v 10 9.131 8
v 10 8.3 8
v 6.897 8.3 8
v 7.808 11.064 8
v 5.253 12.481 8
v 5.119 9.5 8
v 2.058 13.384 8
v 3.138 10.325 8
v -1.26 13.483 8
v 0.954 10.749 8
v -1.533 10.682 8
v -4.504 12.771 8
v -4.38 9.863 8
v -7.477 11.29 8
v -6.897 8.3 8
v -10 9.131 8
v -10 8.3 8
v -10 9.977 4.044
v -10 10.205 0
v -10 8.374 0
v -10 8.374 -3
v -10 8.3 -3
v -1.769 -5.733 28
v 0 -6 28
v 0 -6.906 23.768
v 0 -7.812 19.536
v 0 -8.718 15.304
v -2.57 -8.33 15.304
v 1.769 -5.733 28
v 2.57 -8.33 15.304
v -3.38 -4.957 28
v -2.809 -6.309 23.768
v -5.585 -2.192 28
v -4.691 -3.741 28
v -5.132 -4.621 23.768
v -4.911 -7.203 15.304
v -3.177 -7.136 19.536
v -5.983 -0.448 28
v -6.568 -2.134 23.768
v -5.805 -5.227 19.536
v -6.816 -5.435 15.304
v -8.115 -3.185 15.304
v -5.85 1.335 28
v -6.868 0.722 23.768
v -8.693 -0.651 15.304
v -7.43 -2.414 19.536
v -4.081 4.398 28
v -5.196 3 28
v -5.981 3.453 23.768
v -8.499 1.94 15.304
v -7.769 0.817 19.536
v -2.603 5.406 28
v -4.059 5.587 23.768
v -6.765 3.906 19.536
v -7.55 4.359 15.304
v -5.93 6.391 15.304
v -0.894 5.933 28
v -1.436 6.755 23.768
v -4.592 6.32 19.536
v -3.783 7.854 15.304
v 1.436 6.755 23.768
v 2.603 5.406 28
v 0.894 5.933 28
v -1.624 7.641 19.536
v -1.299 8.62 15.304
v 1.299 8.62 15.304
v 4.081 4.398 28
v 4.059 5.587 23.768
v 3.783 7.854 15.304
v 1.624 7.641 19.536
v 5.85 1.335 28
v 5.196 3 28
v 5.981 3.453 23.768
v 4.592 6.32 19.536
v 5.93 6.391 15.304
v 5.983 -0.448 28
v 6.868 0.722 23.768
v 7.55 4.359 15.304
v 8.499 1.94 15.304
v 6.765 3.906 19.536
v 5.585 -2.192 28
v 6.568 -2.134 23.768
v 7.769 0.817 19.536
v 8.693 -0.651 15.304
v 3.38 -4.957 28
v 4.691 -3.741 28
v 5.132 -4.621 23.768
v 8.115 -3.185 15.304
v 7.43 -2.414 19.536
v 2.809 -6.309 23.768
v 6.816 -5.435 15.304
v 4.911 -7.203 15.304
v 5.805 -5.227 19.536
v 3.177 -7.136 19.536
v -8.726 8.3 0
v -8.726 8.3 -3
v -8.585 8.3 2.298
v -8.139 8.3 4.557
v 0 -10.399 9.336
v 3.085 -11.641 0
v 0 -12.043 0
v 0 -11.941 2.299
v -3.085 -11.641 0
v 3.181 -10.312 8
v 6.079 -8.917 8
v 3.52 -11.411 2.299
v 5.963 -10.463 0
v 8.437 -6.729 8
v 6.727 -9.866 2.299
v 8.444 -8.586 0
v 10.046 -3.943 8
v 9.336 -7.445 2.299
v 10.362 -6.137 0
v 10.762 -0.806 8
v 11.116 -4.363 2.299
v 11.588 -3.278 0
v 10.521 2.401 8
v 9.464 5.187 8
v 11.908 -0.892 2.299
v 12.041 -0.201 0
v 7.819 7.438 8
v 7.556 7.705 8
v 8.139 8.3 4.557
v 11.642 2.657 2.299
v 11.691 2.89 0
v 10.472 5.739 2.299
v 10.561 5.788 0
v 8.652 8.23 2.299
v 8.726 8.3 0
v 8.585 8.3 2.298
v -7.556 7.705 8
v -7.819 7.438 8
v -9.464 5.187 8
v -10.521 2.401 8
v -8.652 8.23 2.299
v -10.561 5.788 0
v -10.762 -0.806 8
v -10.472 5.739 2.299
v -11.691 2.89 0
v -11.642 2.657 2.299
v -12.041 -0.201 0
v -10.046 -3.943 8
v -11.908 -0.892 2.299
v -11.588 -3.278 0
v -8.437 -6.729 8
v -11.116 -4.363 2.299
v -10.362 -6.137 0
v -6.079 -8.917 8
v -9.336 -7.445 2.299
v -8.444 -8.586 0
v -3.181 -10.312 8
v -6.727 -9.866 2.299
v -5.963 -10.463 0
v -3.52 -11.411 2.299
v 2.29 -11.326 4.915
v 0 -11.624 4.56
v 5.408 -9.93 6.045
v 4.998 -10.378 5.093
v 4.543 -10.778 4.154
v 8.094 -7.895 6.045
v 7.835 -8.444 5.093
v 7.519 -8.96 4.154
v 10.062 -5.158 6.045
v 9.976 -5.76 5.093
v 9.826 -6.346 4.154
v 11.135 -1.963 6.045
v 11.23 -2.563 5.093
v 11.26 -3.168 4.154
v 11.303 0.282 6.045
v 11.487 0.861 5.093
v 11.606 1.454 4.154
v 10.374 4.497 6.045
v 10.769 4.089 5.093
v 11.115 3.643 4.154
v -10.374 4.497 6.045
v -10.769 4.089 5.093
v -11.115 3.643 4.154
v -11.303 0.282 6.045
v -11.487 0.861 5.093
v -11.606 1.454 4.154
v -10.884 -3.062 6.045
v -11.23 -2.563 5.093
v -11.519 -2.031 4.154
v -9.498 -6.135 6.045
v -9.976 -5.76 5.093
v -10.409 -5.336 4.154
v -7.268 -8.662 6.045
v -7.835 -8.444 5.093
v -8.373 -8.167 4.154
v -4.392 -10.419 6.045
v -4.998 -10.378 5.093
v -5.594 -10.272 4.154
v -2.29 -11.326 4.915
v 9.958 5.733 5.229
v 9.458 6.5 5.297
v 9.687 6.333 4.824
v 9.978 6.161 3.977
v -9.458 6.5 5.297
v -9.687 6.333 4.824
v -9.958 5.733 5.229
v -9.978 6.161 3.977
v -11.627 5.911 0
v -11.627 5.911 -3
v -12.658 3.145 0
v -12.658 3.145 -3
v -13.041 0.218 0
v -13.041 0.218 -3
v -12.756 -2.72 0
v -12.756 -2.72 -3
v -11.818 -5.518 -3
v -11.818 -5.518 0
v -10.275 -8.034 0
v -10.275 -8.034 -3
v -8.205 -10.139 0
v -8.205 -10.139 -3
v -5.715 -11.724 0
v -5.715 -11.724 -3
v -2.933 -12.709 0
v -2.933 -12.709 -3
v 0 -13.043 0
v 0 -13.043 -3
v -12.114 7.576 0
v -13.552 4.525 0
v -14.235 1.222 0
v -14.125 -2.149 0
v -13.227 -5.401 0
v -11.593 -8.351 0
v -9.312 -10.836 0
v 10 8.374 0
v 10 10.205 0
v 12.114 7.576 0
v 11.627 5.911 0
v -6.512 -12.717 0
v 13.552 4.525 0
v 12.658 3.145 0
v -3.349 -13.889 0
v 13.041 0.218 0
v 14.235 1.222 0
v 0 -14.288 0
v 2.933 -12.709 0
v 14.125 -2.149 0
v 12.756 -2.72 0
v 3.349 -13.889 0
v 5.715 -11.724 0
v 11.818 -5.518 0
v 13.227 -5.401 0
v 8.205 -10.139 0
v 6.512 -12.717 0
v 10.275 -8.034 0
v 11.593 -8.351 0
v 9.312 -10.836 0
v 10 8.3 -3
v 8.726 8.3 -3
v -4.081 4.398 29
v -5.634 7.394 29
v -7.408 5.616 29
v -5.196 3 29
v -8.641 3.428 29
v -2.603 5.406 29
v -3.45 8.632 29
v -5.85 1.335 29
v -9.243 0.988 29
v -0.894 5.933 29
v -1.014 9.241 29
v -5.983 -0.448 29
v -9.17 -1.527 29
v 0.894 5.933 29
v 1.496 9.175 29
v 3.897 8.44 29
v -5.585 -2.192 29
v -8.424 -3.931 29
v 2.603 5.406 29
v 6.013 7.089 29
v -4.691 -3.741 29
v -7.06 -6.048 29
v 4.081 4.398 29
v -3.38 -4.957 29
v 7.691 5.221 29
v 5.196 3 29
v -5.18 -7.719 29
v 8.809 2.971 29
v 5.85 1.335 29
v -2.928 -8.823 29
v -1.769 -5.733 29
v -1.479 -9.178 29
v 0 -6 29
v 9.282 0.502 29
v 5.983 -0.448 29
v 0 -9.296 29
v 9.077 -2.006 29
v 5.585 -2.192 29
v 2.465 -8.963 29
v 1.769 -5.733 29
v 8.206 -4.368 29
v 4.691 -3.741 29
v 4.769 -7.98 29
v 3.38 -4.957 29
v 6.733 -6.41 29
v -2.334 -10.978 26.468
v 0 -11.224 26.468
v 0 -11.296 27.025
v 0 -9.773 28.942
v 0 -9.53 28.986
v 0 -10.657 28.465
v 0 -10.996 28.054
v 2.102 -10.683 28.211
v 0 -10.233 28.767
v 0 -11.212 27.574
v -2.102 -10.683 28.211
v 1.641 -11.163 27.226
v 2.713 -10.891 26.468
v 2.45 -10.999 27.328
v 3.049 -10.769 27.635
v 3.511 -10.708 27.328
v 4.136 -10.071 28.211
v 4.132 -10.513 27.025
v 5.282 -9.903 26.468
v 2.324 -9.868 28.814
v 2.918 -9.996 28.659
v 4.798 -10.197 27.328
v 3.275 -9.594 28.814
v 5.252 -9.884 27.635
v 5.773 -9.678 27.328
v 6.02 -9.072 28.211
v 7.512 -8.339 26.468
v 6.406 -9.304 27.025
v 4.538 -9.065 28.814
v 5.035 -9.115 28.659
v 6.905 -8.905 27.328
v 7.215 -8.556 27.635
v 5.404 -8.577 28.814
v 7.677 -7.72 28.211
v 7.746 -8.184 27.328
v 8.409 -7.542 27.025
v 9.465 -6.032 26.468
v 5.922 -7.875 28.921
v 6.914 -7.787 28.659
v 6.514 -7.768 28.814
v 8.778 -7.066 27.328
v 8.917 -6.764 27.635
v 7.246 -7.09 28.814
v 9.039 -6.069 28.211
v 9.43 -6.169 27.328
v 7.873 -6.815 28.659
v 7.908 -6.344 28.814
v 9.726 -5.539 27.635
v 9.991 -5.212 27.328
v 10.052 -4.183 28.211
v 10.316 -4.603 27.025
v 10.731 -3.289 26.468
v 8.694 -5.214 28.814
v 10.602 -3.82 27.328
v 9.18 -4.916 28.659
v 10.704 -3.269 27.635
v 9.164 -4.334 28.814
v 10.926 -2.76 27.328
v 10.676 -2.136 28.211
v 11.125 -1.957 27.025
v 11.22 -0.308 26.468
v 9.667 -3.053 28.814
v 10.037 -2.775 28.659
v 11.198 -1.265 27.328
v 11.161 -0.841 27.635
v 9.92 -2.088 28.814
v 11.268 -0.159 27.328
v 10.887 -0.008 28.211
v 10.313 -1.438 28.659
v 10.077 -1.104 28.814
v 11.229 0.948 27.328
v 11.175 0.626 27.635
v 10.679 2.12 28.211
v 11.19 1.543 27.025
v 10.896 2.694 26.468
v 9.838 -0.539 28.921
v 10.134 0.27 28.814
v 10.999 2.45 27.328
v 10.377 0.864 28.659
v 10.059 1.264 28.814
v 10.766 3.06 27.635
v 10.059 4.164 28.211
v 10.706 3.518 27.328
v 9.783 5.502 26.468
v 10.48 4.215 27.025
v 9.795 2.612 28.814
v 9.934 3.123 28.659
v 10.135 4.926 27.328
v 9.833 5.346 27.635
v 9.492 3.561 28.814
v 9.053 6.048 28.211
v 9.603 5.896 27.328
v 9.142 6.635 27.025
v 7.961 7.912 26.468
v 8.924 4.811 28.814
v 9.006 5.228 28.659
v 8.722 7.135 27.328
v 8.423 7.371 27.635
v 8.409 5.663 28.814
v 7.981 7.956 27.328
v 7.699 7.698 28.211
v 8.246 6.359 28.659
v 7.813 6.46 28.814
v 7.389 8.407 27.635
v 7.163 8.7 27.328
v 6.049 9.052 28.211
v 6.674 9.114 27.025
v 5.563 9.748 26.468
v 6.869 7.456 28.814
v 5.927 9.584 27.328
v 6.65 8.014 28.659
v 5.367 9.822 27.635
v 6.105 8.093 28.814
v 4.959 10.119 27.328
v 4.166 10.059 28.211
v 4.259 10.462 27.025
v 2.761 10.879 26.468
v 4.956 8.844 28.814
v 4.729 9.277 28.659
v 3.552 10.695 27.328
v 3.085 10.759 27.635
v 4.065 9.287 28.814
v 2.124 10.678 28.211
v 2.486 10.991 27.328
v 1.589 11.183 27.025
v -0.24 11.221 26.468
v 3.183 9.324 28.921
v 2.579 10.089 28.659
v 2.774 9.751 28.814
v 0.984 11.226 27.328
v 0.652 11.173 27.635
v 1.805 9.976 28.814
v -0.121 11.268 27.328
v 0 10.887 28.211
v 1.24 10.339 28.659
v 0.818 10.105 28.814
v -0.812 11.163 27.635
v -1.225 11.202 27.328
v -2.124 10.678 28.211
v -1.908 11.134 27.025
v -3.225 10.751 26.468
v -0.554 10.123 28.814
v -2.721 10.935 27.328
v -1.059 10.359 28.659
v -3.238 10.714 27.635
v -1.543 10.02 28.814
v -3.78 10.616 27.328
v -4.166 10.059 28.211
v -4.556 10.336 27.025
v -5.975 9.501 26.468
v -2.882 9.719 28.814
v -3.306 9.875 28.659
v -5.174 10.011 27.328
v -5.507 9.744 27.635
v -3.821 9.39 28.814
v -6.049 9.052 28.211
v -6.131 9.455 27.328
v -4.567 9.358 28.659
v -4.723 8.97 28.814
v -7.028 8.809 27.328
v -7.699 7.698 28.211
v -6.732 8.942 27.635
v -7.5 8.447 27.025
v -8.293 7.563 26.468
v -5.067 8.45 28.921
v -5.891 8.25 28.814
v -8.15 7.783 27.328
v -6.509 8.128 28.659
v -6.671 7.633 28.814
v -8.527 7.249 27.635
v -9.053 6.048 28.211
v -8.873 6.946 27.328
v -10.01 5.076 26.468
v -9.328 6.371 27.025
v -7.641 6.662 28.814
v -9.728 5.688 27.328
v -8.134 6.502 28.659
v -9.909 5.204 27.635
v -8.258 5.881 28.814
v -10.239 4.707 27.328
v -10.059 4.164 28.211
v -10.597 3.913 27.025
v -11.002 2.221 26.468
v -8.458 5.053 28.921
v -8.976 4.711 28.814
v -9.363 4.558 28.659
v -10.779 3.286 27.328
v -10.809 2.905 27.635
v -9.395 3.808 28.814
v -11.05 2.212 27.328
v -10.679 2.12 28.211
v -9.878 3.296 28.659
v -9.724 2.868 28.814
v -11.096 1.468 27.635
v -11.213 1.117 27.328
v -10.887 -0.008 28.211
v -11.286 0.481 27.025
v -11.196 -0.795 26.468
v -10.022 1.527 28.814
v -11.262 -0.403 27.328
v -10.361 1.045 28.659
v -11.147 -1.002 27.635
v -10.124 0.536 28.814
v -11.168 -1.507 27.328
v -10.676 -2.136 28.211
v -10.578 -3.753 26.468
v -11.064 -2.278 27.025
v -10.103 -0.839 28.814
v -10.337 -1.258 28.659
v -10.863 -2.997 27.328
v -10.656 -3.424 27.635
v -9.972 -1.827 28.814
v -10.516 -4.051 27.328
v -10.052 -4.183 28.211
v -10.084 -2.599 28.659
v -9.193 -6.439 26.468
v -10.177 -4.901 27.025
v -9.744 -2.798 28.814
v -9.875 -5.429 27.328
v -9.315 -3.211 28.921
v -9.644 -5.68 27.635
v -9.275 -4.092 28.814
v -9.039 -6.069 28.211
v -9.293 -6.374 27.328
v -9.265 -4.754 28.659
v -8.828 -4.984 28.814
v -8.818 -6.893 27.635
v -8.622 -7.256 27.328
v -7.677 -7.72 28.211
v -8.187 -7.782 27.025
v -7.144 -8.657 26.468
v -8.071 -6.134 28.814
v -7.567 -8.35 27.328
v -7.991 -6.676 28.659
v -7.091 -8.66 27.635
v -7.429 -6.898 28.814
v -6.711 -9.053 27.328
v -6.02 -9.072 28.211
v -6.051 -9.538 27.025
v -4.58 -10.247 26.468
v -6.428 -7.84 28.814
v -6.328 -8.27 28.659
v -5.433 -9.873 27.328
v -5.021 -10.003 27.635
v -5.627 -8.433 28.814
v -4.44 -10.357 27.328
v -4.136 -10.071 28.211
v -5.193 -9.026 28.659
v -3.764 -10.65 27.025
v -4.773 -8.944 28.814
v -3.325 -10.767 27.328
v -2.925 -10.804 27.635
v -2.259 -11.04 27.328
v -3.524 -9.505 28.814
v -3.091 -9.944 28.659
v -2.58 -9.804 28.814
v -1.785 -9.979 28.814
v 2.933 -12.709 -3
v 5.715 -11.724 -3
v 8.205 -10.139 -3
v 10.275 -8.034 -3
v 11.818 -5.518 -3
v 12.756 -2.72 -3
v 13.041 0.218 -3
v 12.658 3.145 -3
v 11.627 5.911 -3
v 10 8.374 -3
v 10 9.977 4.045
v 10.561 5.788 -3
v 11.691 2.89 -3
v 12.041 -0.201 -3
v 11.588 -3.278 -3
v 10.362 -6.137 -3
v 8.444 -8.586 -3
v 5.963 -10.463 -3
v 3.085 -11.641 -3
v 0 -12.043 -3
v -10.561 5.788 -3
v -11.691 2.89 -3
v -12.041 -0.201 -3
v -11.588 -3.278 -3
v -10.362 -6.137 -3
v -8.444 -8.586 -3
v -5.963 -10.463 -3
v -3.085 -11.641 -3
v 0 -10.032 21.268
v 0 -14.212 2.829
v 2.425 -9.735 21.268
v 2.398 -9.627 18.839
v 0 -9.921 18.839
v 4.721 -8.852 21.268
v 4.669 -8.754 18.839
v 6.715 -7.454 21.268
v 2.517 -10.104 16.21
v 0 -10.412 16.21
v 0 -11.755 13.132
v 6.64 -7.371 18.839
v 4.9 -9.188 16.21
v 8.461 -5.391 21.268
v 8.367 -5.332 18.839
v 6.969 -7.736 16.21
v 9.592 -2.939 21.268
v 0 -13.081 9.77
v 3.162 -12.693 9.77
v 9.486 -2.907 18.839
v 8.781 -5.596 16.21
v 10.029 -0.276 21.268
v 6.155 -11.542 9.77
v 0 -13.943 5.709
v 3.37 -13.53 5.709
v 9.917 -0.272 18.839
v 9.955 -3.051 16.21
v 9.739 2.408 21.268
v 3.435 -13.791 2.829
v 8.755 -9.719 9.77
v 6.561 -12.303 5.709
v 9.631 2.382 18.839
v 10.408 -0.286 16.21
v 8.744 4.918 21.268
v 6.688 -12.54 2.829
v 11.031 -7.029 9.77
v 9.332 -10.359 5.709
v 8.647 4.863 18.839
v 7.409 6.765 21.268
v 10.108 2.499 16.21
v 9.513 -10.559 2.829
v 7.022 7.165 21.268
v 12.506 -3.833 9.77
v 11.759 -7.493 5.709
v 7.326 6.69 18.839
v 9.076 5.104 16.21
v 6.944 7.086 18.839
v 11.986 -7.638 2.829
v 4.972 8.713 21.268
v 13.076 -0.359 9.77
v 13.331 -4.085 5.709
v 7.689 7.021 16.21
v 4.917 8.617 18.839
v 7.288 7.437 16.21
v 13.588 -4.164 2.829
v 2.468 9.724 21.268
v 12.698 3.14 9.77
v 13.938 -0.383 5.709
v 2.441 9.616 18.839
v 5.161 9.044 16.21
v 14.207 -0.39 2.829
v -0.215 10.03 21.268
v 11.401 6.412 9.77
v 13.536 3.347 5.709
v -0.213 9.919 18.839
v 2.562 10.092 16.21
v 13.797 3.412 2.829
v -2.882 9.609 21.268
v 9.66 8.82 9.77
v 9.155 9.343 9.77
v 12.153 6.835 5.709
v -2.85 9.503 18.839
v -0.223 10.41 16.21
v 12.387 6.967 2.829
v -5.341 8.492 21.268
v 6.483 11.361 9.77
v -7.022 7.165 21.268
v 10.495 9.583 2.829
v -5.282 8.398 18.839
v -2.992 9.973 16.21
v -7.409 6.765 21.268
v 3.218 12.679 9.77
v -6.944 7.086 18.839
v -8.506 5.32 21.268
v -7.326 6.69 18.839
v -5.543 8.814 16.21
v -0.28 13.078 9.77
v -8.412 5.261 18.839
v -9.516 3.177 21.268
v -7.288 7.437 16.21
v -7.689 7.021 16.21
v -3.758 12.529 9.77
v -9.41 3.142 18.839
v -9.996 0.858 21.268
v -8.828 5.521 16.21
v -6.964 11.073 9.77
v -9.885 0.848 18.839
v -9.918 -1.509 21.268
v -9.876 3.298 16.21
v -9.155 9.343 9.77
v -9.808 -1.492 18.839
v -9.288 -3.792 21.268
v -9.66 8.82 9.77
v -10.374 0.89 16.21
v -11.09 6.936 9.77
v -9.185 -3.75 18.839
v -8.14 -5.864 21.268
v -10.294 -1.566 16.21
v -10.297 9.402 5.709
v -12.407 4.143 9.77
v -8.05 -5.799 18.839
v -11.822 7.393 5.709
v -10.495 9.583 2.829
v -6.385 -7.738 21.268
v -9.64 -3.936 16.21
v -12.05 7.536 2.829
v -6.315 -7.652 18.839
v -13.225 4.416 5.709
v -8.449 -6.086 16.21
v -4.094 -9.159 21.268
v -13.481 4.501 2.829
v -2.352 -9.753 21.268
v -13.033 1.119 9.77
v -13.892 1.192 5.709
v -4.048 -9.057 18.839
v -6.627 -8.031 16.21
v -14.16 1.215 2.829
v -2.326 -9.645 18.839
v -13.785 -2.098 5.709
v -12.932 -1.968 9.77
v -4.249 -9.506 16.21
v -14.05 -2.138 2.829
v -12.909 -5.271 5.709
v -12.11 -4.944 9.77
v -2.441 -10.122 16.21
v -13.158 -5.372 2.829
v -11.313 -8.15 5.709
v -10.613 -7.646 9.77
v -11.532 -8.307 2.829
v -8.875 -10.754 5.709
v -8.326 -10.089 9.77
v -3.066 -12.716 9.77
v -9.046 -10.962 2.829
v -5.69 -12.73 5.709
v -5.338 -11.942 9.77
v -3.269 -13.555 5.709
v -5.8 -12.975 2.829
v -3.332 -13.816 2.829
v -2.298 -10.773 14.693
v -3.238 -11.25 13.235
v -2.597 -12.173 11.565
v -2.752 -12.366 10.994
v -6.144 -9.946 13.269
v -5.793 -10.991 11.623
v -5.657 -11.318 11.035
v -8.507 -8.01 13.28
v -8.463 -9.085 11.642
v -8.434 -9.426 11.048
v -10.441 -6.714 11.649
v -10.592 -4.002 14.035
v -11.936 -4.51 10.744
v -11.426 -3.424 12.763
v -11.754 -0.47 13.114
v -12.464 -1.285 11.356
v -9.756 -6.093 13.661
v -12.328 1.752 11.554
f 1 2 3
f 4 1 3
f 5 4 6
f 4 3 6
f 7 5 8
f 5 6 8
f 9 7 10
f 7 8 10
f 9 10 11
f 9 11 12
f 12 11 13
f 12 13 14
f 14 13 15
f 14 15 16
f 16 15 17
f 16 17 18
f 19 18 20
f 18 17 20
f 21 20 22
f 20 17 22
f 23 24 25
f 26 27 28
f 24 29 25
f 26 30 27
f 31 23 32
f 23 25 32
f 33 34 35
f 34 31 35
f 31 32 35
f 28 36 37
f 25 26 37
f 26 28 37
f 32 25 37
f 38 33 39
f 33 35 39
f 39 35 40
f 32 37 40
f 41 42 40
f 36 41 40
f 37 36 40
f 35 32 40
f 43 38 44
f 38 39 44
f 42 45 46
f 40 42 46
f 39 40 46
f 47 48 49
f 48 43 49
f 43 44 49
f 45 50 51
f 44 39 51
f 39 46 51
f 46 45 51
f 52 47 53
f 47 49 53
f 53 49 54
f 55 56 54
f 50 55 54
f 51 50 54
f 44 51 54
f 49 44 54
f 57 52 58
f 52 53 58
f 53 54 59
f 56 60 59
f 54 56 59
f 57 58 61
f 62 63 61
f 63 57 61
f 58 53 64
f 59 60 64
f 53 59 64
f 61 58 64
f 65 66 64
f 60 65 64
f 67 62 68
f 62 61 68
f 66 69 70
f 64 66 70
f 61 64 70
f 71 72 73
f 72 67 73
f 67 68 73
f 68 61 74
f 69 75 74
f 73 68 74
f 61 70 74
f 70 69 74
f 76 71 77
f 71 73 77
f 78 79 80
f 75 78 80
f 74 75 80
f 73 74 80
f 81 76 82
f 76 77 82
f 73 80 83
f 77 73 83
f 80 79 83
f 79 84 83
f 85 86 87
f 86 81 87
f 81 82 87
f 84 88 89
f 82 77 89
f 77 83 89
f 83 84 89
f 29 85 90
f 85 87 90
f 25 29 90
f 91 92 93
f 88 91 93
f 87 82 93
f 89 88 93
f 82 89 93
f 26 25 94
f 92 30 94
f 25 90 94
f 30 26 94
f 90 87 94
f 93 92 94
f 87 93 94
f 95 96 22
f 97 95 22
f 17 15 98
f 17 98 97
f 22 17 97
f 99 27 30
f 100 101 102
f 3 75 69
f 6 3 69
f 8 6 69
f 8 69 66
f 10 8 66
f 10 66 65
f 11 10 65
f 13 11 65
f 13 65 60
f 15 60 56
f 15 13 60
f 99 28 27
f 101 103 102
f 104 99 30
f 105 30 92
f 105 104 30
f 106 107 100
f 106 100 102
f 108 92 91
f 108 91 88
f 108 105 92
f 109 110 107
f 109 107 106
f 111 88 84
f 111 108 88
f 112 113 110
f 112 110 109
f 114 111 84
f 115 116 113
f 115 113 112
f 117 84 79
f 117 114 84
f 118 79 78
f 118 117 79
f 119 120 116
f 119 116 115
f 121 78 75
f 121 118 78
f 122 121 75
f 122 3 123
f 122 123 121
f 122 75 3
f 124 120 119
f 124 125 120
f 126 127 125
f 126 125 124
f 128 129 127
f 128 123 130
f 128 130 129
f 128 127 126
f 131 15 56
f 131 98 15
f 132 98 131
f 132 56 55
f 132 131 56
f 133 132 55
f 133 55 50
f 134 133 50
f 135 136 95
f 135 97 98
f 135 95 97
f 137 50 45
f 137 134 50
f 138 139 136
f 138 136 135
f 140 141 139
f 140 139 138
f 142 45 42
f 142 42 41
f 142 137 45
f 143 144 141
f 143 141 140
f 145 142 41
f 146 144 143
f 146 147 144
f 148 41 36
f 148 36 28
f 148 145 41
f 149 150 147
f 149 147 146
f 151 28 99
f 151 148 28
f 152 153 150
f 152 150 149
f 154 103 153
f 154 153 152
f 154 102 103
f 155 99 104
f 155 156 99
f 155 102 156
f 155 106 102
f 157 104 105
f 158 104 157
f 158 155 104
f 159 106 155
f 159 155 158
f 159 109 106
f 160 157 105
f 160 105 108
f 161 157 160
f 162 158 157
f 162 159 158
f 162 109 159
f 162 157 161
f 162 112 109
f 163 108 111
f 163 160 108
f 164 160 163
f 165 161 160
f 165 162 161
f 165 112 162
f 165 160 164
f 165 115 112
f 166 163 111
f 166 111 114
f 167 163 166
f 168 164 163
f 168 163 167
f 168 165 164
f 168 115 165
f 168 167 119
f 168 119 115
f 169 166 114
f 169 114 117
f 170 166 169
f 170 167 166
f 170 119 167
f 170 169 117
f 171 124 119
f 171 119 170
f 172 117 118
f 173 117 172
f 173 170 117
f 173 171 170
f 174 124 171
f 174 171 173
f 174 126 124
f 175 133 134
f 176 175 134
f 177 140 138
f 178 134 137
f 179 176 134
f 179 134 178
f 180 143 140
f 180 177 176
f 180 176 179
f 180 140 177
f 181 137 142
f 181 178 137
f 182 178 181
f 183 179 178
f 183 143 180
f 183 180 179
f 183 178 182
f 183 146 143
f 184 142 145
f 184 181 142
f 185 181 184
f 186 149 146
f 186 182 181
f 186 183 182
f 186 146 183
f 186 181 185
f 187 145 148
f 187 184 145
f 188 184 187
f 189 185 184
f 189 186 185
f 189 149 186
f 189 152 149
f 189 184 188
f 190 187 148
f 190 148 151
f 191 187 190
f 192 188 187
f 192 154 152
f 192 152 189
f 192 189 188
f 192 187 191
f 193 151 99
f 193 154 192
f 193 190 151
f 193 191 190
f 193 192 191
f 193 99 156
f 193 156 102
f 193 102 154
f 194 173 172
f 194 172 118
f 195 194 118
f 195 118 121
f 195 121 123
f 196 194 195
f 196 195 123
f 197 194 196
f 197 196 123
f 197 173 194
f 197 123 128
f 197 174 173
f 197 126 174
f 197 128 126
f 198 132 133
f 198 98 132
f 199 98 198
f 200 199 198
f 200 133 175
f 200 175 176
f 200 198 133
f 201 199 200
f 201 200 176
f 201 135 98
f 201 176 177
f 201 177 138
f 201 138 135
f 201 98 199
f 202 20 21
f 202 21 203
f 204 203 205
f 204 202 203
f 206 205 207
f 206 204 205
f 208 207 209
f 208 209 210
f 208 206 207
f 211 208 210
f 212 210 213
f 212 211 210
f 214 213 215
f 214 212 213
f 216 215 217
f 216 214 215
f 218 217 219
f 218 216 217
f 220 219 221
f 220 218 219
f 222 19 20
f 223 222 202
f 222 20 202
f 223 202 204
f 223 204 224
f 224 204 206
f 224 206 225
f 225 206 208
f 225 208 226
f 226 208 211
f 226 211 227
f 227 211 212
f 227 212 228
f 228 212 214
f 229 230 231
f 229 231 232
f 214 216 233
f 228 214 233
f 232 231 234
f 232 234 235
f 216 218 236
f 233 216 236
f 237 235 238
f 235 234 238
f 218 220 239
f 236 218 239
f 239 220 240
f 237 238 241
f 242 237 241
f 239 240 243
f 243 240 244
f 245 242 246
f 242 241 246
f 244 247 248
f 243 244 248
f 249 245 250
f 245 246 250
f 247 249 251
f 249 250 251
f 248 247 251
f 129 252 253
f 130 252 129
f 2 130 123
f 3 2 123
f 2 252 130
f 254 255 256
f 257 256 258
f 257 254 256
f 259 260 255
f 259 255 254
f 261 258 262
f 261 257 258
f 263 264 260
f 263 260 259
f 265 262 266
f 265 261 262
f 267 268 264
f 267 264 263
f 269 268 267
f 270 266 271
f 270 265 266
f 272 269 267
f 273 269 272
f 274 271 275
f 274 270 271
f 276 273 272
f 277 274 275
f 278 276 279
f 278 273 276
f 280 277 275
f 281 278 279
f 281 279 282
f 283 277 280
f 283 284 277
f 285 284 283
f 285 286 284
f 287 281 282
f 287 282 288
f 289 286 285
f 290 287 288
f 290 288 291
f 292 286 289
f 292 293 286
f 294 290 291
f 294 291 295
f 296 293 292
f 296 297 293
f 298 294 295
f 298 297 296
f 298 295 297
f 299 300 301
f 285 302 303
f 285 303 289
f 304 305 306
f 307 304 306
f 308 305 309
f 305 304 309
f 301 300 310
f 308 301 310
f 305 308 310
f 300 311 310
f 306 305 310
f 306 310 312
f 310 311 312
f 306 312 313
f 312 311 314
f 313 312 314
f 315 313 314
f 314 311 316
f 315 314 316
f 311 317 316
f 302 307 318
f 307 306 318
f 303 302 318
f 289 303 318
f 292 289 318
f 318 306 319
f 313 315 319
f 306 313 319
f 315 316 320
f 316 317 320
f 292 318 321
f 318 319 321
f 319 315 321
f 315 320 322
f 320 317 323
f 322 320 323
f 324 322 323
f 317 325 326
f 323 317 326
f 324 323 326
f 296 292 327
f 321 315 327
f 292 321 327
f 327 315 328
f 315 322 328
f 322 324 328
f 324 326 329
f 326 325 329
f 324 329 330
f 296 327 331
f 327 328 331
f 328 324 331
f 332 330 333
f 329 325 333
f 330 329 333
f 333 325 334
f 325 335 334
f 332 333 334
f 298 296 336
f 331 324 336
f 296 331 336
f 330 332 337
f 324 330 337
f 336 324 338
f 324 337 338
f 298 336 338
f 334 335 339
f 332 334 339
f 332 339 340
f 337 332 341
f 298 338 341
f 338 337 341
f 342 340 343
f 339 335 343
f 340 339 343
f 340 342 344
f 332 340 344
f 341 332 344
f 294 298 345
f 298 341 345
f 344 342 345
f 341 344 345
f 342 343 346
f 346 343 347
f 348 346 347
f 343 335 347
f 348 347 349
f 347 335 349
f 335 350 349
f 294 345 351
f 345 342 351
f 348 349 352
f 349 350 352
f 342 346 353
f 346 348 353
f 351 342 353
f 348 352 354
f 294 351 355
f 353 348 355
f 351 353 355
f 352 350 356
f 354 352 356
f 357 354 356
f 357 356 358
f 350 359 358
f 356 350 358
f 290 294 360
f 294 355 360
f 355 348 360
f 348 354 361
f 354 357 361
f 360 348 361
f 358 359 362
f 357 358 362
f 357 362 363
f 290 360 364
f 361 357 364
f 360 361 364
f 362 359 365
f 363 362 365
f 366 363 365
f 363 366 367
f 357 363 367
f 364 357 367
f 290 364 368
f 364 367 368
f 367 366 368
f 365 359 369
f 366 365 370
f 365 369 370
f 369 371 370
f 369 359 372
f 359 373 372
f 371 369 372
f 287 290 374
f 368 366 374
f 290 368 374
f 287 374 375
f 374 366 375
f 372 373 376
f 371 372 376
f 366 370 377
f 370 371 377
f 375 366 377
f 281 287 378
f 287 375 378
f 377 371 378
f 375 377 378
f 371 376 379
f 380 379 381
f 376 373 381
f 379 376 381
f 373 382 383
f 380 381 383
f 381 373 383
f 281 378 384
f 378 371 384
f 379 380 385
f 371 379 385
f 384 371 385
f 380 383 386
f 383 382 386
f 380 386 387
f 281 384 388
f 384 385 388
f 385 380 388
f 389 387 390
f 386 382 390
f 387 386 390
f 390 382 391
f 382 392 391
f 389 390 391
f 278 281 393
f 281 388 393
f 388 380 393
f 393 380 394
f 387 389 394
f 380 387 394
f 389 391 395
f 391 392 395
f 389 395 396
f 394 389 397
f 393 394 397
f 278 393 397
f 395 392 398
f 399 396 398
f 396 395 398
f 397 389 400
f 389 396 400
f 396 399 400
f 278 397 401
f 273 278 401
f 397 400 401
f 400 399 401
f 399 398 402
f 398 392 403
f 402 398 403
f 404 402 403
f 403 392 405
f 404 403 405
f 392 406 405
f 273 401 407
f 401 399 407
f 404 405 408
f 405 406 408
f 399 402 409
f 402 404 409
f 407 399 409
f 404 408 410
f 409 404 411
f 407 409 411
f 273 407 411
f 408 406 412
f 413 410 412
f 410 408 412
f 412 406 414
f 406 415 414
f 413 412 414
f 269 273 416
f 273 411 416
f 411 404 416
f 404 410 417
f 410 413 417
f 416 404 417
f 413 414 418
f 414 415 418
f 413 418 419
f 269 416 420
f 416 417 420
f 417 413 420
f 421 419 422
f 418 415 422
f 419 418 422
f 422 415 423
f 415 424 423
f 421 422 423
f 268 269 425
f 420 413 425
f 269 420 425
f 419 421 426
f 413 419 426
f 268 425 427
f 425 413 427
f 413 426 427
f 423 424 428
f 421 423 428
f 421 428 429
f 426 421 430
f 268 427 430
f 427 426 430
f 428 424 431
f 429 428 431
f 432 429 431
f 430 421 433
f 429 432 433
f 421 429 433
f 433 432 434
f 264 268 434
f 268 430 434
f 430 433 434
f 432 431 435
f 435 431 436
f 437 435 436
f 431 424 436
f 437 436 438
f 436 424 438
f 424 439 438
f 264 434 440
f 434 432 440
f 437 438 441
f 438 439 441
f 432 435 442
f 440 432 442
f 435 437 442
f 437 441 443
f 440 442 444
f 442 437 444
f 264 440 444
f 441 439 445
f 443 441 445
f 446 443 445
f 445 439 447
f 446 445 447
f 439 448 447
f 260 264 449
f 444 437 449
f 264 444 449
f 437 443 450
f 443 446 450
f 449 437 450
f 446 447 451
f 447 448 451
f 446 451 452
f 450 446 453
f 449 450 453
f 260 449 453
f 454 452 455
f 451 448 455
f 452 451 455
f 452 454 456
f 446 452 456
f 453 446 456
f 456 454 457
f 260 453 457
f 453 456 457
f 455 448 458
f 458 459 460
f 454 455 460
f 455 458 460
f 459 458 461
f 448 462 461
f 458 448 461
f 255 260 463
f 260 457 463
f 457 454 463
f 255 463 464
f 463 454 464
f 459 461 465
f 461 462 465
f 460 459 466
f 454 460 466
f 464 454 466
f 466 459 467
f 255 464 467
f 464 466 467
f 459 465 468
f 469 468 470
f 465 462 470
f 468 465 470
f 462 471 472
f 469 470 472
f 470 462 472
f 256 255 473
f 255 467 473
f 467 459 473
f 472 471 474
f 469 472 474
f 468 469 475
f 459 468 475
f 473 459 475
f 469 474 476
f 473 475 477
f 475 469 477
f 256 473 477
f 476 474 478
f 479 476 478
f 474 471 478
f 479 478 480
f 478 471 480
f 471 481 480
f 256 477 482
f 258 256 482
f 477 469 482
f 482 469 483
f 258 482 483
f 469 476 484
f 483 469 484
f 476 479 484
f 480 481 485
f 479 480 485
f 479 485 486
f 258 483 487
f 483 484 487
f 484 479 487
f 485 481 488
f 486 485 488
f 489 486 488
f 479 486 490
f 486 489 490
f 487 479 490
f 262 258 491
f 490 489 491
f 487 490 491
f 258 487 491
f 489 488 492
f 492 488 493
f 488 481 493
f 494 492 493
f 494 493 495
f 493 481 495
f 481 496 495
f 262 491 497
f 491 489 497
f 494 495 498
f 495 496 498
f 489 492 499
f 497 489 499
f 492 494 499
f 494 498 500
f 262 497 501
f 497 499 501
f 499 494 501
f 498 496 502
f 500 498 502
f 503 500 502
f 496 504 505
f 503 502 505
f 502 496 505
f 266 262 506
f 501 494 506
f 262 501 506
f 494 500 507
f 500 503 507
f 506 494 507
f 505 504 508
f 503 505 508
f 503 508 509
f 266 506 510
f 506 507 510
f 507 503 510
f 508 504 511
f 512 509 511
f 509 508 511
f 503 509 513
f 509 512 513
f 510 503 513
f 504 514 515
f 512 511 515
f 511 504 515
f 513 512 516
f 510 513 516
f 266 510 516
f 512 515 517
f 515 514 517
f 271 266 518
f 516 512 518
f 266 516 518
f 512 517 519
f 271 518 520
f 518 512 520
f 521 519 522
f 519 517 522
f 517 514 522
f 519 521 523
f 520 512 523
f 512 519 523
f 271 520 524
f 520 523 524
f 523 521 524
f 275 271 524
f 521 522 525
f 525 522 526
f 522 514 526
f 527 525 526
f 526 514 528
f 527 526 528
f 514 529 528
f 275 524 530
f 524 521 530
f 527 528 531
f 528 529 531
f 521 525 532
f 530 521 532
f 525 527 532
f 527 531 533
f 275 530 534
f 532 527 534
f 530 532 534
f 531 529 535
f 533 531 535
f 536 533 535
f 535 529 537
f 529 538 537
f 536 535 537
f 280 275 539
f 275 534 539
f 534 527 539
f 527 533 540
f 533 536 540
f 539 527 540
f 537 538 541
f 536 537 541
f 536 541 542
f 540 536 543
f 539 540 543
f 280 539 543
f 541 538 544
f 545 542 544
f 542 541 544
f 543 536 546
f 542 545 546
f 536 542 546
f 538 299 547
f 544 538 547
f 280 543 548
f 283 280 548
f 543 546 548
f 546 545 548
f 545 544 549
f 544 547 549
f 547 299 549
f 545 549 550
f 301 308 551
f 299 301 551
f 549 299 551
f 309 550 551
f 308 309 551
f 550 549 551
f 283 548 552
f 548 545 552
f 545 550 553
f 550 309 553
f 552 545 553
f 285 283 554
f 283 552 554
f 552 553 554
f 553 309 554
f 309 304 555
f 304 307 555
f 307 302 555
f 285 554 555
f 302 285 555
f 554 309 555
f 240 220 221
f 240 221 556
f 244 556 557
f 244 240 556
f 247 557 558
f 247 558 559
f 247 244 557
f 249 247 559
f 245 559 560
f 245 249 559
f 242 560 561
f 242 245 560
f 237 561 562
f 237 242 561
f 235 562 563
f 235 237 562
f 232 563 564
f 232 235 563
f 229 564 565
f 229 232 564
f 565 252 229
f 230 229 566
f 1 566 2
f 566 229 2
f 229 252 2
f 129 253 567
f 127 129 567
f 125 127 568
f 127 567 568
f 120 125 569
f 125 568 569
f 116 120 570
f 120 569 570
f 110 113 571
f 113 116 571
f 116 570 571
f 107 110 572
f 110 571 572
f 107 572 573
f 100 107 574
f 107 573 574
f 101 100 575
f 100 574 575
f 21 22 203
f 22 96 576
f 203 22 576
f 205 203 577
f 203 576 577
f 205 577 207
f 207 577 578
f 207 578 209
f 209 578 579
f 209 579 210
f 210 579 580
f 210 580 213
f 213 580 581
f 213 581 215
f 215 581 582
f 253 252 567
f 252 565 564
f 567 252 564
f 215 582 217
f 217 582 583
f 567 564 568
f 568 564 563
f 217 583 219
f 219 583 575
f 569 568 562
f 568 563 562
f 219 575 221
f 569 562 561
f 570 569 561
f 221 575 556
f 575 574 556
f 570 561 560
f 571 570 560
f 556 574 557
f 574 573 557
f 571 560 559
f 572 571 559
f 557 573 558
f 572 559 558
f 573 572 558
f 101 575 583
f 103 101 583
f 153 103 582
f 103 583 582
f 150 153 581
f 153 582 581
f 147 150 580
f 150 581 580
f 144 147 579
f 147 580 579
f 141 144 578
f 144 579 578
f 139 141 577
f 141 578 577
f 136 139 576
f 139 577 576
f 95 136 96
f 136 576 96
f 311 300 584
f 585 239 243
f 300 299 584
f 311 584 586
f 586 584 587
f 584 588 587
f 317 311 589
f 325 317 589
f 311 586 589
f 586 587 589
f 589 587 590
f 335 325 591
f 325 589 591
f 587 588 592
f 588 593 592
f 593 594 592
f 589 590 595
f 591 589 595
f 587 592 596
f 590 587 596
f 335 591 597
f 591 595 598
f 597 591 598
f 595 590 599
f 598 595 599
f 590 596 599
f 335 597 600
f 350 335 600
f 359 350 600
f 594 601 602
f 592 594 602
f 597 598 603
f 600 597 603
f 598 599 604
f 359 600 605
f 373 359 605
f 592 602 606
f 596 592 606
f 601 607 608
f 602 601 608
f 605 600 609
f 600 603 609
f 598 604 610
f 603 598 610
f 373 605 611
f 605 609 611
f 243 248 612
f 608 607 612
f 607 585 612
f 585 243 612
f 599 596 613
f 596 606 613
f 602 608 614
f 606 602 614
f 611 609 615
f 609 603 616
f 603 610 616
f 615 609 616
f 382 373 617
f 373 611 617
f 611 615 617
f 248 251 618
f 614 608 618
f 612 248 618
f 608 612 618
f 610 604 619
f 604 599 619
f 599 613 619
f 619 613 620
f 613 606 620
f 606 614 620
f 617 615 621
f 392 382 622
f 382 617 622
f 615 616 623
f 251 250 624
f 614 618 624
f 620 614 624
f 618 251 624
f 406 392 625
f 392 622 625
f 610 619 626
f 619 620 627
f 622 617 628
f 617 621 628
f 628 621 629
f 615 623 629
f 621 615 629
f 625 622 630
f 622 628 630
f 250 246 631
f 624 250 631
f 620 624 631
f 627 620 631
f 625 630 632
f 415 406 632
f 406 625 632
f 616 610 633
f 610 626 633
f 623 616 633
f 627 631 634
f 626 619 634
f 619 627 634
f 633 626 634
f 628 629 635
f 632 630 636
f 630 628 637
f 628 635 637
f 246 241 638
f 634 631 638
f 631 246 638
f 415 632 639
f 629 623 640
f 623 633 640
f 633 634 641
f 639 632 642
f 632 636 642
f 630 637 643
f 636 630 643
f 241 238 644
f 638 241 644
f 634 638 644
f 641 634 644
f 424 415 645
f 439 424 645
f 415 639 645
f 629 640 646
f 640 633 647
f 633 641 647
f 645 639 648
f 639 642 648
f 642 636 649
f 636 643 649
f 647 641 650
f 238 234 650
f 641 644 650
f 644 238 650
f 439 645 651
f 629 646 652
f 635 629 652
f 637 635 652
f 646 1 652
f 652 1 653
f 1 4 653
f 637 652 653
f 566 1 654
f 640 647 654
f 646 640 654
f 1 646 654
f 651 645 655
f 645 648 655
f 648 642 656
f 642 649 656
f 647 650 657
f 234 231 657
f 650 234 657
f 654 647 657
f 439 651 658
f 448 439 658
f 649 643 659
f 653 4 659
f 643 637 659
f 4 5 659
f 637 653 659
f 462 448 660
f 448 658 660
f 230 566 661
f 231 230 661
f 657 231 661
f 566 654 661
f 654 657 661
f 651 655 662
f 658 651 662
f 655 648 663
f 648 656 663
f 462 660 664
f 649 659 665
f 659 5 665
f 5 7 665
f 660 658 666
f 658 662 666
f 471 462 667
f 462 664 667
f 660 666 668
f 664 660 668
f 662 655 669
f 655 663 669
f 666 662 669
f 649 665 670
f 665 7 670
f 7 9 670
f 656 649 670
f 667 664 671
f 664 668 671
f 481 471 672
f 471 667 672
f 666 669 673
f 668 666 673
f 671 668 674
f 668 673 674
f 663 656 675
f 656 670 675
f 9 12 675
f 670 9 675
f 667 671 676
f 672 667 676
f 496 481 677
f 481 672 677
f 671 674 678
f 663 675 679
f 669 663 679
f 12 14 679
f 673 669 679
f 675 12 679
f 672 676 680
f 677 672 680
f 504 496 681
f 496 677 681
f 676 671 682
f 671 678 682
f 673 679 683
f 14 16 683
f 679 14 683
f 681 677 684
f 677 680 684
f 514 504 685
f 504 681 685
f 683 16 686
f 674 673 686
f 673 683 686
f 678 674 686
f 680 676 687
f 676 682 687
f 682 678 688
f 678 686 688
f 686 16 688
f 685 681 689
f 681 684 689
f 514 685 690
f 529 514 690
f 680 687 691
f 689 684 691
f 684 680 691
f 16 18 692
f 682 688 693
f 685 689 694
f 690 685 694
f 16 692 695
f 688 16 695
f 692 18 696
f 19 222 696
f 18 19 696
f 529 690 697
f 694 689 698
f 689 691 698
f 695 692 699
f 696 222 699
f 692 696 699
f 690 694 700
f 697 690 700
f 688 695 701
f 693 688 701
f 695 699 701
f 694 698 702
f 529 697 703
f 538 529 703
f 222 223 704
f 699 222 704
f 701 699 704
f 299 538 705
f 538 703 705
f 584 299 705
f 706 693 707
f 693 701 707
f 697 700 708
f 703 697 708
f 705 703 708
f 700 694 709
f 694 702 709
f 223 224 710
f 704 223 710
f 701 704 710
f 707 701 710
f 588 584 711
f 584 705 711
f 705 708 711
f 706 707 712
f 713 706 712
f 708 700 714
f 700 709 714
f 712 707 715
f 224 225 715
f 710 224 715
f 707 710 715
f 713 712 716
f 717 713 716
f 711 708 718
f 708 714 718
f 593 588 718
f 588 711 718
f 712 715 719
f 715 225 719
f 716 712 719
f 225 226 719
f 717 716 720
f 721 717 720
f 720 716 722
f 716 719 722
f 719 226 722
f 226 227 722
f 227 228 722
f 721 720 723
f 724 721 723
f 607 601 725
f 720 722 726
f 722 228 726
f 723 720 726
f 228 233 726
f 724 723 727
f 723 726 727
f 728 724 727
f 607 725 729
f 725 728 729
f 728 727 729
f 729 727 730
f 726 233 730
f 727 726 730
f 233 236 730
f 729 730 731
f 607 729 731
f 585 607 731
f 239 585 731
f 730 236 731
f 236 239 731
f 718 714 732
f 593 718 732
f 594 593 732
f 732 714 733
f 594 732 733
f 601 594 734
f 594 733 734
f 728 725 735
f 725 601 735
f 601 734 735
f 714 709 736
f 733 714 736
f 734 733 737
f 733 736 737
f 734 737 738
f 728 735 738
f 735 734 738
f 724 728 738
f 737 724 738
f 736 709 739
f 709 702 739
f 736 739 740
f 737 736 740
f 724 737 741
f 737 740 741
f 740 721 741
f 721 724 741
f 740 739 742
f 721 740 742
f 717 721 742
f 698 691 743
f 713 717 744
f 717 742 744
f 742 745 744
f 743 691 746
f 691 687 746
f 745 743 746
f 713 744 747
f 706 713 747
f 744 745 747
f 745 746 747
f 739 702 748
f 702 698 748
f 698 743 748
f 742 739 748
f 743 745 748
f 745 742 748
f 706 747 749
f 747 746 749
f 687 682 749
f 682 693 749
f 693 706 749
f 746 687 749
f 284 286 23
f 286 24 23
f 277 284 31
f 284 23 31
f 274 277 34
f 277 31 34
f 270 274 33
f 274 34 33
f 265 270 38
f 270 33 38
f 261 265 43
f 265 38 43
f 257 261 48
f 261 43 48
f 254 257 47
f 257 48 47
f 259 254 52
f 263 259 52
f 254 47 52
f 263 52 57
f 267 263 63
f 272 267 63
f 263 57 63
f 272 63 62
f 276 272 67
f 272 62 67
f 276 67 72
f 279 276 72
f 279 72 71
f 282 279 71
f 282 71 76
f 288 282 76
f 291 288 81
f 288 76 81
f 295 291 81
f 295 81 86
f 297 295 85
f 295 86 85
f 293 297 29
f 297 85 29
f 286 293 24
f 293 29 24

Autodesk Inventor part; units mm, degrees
ref_plane "YZ Plane" through (0, 0, 0) normal (1, 0, 0) x (0, 1, 0)
ref_plane "XY Plane" through (0, 0, 0) normal (0, 0, 1) x (1, 0, 0)
sketch "Block1" plane through (0, 0, 0) normal (0, 0, 1) x (1, 0, 0)
  line L0 (-13, 33) -> (0, 33)
  line L1 (0, 33) -> (0, 31.984)
  line L2 (0, 0) -> (-7.5, 0)
  line L3 (-5.5, 31.984) -> (0, 31.984)
  spline S0 degree 4 poles (-5.5, 31.984) (-8.3018, 31.984) (-14.9701, 28.615) (-2.778, 19.5085) (-12.1324, 9.4997) (-13.0429, 3.8555) (-13.0429, 0) knots 0 0 0 0 0 0.349618 0.599618 1 1 1 1 1
  spline S1 degree 4 poles (-5.5, 33) (-8.695, 33) (-16.2444, 29.0645) (-3.8371, 19.8287) (-13.0244, 9.853) (-14.2875, 3.9571) (-14.2875, 0) knots 0 0 0 0 0 0.356198 0.606198 1 1 1 1 1
  line L4 (-13.0429, 0) -> (13.0429, 0)
  line L5 (13.0429, 0) -> (13.0429, -90)
  line L6 (13.0429, -90) -> (-13.0429, -90)
  line L7 (-13.0429, -90) -> (-13.0429, 0)
  line L8 (0, 33) -> (0, 31.984)
  line L9 (0, 0) -> (14.2875, 0)
  line L10 (14.2875, 0) -> (14.2875, -90)
  line L11 (14.2875, -90) -> (-14.2875, -90)
  line L12 (-14.2875, -90) -> (-14.2875, 0)
  line L13 (-14.2875, 0) -> (-13.0429, 0)
  line L14 (-13.0429, 0) -> (-12.0269, 0)
  line L15 (-12.0269, 0) -> (-12.0269, -5)
  line L16 (-12.0269, -5) -> (-13.0429, -5)
  line L17 (-13.0429, -5) -> (-13.0429, 0)
  spline S2 degree 4 poles (-12.0269, 0) (-12.0269, 1.8651) (-12.9196, 3.9842) (-12.4898, 5.3301) (-12.0051, 6.8202) knots 0 0 0 0 0 1 1 1 1 1
  point P0 (-5.8286, -1.9888)
  point P1 (-2.75, 31.984)
  point P2 (-10.8475, 28.6822)
  point P3 (-8.5755, 20.4298)
  point P4 (-10.7949, 9.9764)
  point P5 (-11.8109, 29.0047)
  point P6 (-9.5915, 20.5086)
  point P7 (-11.8109, 10.2944)
  point P8 (-12.757, 3.7934)
  point P9 (-12.2202, 6.1237)
  point P10 (-12.4905, 4.0174)
  dimension "d0" = 1.016
  dimension "d1" = 1.016
  dimension "d2" = 1.016
  dimension "d3" = 1.016
  dimension "d4" = 90
  dimension "d5" = 26.0858
  dimension "d6" = 33
  dimension "d7" = 5.5
  dimension "d8" = 28.575
  dimension "d9" = 5
  dimension "d10" = 1.016
sketch "Sketch2" plane through (0, 0, 0) normal (1, 0, 0) x (0, 1, 0)
  point P0 (0, 0)
sketch "Sketch3" plane through (0, 0, 0) normal (1, 0, 0) x (0, 1, 0)
  line L0 (0, -114.856) -> (0, 59.1357) projected
  line L1 (0, 29) -> (-11.8121, 29)
  line L2 (-13.0429, 0) -> (-12.0429, 0)
  line L3 (-12.0429, 0) -> (-12.0429, -3)
  line L4 (-12.0429, -3) -> (-13.0429, -3)
  line L5 (-13.0429, -3) -> (-13.0429, 0)
  line L6 (-14.2875, 0) -> (-14.2875, -7.5209)
  spline S0 degree 4 poles (-8.7178, 15.3035) (-9.5873, 11.2411) (-11.424, 6.9381) (-12.0429, 3.6863) (-12.0429, 0) knots 0 0 0 0 0 1 1 1 1 1
  spline S1 degree 4 poles (-11.8121, 29) (-11.4923, 26.2408) (-6.533, 15.3028) (-13.5295, 15.4591) (-14.2875, 3.7094) (-14.2875, 0) knots 0 0 0 0 0 0.596386 1 1 1 1 1
  line L7 (-14.2875, 0) -> (-13.0429, 0)
  line L8 (0, 29) -> (-11.625, 29)
  line L9 (-11.625, 28) -> (0, 28)
  line L10 (0, 28) -> (0, 29)
  line L11 (-6, 28) -> (-8.7178, 15.3035)
  point P0 (0, 0)
  point P1 (-12.0269, 0)
  point P2 (-6, 29)
  point P3 (-11.1126, 6.8247)
  point P4 (-10.2731, 22.7051)
  point P5 (-10.2729, 16.6704)
  point P6 (-12.5423, 11.3252)
  dimension "d12" = 29
  dimension "d13" = 14.2875
  dimension "d14" = 3
  dimension "d15" = 1
  dimension "d17" = 13.0429
  dimension "d18" = 1
  dimension "d35" = 6
revolve "Revolution1" add sketch "Sketch3" angle 360 about axis through (0, 0, -10) along (0, 0, 1)
fillet "Fillet1" radius 2 1 edges at (0, 11.8121, 29)
fillet "Fillet2" [suppressed]
hole "Hole1" at (0, 0, 29) direction (0, 0, -1) diameter 12 end through all
ref_plane "Work Plane2" through (0, 8.3, 0) normal (0, 1, 0) x (-1, 0, 0)
sketch "Sketch6" plane through (0, 8.3, 0) normal (0, 1, 0) x (-1, 0, 0)
  arc A0 (2.6663, 15.3035) -> (-2.6663, 15.3035) centre (-2.6663, 15.3035) ccw projected
  arc A1 (-2.6663, 15.3035) -> (-8.7259, 0) centre (-8.7259, 0) ccw projected
  line L0 (-8.7259, 0) -> (-8.7259, -3) projected
  line L1 (-8.7259, -3) -> (-10.0612, -3) projected
  line L2 (-10.0612, -3) -> (-10.0612, 0) projected
  line L3 (-10.0612, 0) -> (-11.6294, 0) projected
  arc A2 (-11.6294, 0) -> (-7.5554, 26.4676) centre (-7.5554, 26.4676) ccw projected
  arc A3 (-7.5554, 26.4676) -> (-4.1863, 29) centre (-4.1863, 29) ccw projected
  line L4 (-4.1863, 29) -> (4.1863, 29) projected
  arc A4 (4.1863, 29) -> (7.5554, 26.4676) centre (7.5554, 26.4676) ccw projected
  arc A5 (7.5554, 26.4676) -> (11.6294, 0) centre (11.6294, 0) ccw projected
  line L5 (11.6294, 0) -> (10.0612, 0) projected
  line L6 (10.0612, 0) -> (10.0612, -3) projected
  line L7 (10.0612, -3) -> (8.7259, -3) projected
  line L8 (8.7259, -3) -> (8.7259, 0) projected
  arc A6 (8.7259, 0) -> (2.6663, 15.3035) centre (2.6663, 15.3035) ccw projected
  line L9 (12.0429, -3) -> (-12.0429, -3) projected
  line L10 (0, -114.856) -> (0, 59.1357) projected
  line L11 (-10, 8) -> (10, 8)
  line L12 (10, 8) -> (10, -3)
  line L13 (10, -3) -> (-10, -3)
  line L14 (-10, -3) -> (-10, 8)
  point P0 (0, 0)
  point P1 (0, 8)
  dimension "d46" = 11
  dimension "d47" = 20
extrude "Extrusion1" cut sketch "Sketch6" along normal through all contours L11 L12 A2 L10 | L10 A2 L0 A1 L14 L11 | L10 L9 L0 A2 | A2 L12 A6 L8 L9 L10 | A2 A1 L0 | L0 L1 L14 A1 A2 | A2 A1 L14 | L8 A6 L12 L7
equation "\"d0\" = d11"
equation "\"d1\" = d11"
equation "\"d2\" = d11"
equation "\"d3\" = d11"
equation "\"d11\" = 1.016"
properties part number "New" material "Stainless Steel"
